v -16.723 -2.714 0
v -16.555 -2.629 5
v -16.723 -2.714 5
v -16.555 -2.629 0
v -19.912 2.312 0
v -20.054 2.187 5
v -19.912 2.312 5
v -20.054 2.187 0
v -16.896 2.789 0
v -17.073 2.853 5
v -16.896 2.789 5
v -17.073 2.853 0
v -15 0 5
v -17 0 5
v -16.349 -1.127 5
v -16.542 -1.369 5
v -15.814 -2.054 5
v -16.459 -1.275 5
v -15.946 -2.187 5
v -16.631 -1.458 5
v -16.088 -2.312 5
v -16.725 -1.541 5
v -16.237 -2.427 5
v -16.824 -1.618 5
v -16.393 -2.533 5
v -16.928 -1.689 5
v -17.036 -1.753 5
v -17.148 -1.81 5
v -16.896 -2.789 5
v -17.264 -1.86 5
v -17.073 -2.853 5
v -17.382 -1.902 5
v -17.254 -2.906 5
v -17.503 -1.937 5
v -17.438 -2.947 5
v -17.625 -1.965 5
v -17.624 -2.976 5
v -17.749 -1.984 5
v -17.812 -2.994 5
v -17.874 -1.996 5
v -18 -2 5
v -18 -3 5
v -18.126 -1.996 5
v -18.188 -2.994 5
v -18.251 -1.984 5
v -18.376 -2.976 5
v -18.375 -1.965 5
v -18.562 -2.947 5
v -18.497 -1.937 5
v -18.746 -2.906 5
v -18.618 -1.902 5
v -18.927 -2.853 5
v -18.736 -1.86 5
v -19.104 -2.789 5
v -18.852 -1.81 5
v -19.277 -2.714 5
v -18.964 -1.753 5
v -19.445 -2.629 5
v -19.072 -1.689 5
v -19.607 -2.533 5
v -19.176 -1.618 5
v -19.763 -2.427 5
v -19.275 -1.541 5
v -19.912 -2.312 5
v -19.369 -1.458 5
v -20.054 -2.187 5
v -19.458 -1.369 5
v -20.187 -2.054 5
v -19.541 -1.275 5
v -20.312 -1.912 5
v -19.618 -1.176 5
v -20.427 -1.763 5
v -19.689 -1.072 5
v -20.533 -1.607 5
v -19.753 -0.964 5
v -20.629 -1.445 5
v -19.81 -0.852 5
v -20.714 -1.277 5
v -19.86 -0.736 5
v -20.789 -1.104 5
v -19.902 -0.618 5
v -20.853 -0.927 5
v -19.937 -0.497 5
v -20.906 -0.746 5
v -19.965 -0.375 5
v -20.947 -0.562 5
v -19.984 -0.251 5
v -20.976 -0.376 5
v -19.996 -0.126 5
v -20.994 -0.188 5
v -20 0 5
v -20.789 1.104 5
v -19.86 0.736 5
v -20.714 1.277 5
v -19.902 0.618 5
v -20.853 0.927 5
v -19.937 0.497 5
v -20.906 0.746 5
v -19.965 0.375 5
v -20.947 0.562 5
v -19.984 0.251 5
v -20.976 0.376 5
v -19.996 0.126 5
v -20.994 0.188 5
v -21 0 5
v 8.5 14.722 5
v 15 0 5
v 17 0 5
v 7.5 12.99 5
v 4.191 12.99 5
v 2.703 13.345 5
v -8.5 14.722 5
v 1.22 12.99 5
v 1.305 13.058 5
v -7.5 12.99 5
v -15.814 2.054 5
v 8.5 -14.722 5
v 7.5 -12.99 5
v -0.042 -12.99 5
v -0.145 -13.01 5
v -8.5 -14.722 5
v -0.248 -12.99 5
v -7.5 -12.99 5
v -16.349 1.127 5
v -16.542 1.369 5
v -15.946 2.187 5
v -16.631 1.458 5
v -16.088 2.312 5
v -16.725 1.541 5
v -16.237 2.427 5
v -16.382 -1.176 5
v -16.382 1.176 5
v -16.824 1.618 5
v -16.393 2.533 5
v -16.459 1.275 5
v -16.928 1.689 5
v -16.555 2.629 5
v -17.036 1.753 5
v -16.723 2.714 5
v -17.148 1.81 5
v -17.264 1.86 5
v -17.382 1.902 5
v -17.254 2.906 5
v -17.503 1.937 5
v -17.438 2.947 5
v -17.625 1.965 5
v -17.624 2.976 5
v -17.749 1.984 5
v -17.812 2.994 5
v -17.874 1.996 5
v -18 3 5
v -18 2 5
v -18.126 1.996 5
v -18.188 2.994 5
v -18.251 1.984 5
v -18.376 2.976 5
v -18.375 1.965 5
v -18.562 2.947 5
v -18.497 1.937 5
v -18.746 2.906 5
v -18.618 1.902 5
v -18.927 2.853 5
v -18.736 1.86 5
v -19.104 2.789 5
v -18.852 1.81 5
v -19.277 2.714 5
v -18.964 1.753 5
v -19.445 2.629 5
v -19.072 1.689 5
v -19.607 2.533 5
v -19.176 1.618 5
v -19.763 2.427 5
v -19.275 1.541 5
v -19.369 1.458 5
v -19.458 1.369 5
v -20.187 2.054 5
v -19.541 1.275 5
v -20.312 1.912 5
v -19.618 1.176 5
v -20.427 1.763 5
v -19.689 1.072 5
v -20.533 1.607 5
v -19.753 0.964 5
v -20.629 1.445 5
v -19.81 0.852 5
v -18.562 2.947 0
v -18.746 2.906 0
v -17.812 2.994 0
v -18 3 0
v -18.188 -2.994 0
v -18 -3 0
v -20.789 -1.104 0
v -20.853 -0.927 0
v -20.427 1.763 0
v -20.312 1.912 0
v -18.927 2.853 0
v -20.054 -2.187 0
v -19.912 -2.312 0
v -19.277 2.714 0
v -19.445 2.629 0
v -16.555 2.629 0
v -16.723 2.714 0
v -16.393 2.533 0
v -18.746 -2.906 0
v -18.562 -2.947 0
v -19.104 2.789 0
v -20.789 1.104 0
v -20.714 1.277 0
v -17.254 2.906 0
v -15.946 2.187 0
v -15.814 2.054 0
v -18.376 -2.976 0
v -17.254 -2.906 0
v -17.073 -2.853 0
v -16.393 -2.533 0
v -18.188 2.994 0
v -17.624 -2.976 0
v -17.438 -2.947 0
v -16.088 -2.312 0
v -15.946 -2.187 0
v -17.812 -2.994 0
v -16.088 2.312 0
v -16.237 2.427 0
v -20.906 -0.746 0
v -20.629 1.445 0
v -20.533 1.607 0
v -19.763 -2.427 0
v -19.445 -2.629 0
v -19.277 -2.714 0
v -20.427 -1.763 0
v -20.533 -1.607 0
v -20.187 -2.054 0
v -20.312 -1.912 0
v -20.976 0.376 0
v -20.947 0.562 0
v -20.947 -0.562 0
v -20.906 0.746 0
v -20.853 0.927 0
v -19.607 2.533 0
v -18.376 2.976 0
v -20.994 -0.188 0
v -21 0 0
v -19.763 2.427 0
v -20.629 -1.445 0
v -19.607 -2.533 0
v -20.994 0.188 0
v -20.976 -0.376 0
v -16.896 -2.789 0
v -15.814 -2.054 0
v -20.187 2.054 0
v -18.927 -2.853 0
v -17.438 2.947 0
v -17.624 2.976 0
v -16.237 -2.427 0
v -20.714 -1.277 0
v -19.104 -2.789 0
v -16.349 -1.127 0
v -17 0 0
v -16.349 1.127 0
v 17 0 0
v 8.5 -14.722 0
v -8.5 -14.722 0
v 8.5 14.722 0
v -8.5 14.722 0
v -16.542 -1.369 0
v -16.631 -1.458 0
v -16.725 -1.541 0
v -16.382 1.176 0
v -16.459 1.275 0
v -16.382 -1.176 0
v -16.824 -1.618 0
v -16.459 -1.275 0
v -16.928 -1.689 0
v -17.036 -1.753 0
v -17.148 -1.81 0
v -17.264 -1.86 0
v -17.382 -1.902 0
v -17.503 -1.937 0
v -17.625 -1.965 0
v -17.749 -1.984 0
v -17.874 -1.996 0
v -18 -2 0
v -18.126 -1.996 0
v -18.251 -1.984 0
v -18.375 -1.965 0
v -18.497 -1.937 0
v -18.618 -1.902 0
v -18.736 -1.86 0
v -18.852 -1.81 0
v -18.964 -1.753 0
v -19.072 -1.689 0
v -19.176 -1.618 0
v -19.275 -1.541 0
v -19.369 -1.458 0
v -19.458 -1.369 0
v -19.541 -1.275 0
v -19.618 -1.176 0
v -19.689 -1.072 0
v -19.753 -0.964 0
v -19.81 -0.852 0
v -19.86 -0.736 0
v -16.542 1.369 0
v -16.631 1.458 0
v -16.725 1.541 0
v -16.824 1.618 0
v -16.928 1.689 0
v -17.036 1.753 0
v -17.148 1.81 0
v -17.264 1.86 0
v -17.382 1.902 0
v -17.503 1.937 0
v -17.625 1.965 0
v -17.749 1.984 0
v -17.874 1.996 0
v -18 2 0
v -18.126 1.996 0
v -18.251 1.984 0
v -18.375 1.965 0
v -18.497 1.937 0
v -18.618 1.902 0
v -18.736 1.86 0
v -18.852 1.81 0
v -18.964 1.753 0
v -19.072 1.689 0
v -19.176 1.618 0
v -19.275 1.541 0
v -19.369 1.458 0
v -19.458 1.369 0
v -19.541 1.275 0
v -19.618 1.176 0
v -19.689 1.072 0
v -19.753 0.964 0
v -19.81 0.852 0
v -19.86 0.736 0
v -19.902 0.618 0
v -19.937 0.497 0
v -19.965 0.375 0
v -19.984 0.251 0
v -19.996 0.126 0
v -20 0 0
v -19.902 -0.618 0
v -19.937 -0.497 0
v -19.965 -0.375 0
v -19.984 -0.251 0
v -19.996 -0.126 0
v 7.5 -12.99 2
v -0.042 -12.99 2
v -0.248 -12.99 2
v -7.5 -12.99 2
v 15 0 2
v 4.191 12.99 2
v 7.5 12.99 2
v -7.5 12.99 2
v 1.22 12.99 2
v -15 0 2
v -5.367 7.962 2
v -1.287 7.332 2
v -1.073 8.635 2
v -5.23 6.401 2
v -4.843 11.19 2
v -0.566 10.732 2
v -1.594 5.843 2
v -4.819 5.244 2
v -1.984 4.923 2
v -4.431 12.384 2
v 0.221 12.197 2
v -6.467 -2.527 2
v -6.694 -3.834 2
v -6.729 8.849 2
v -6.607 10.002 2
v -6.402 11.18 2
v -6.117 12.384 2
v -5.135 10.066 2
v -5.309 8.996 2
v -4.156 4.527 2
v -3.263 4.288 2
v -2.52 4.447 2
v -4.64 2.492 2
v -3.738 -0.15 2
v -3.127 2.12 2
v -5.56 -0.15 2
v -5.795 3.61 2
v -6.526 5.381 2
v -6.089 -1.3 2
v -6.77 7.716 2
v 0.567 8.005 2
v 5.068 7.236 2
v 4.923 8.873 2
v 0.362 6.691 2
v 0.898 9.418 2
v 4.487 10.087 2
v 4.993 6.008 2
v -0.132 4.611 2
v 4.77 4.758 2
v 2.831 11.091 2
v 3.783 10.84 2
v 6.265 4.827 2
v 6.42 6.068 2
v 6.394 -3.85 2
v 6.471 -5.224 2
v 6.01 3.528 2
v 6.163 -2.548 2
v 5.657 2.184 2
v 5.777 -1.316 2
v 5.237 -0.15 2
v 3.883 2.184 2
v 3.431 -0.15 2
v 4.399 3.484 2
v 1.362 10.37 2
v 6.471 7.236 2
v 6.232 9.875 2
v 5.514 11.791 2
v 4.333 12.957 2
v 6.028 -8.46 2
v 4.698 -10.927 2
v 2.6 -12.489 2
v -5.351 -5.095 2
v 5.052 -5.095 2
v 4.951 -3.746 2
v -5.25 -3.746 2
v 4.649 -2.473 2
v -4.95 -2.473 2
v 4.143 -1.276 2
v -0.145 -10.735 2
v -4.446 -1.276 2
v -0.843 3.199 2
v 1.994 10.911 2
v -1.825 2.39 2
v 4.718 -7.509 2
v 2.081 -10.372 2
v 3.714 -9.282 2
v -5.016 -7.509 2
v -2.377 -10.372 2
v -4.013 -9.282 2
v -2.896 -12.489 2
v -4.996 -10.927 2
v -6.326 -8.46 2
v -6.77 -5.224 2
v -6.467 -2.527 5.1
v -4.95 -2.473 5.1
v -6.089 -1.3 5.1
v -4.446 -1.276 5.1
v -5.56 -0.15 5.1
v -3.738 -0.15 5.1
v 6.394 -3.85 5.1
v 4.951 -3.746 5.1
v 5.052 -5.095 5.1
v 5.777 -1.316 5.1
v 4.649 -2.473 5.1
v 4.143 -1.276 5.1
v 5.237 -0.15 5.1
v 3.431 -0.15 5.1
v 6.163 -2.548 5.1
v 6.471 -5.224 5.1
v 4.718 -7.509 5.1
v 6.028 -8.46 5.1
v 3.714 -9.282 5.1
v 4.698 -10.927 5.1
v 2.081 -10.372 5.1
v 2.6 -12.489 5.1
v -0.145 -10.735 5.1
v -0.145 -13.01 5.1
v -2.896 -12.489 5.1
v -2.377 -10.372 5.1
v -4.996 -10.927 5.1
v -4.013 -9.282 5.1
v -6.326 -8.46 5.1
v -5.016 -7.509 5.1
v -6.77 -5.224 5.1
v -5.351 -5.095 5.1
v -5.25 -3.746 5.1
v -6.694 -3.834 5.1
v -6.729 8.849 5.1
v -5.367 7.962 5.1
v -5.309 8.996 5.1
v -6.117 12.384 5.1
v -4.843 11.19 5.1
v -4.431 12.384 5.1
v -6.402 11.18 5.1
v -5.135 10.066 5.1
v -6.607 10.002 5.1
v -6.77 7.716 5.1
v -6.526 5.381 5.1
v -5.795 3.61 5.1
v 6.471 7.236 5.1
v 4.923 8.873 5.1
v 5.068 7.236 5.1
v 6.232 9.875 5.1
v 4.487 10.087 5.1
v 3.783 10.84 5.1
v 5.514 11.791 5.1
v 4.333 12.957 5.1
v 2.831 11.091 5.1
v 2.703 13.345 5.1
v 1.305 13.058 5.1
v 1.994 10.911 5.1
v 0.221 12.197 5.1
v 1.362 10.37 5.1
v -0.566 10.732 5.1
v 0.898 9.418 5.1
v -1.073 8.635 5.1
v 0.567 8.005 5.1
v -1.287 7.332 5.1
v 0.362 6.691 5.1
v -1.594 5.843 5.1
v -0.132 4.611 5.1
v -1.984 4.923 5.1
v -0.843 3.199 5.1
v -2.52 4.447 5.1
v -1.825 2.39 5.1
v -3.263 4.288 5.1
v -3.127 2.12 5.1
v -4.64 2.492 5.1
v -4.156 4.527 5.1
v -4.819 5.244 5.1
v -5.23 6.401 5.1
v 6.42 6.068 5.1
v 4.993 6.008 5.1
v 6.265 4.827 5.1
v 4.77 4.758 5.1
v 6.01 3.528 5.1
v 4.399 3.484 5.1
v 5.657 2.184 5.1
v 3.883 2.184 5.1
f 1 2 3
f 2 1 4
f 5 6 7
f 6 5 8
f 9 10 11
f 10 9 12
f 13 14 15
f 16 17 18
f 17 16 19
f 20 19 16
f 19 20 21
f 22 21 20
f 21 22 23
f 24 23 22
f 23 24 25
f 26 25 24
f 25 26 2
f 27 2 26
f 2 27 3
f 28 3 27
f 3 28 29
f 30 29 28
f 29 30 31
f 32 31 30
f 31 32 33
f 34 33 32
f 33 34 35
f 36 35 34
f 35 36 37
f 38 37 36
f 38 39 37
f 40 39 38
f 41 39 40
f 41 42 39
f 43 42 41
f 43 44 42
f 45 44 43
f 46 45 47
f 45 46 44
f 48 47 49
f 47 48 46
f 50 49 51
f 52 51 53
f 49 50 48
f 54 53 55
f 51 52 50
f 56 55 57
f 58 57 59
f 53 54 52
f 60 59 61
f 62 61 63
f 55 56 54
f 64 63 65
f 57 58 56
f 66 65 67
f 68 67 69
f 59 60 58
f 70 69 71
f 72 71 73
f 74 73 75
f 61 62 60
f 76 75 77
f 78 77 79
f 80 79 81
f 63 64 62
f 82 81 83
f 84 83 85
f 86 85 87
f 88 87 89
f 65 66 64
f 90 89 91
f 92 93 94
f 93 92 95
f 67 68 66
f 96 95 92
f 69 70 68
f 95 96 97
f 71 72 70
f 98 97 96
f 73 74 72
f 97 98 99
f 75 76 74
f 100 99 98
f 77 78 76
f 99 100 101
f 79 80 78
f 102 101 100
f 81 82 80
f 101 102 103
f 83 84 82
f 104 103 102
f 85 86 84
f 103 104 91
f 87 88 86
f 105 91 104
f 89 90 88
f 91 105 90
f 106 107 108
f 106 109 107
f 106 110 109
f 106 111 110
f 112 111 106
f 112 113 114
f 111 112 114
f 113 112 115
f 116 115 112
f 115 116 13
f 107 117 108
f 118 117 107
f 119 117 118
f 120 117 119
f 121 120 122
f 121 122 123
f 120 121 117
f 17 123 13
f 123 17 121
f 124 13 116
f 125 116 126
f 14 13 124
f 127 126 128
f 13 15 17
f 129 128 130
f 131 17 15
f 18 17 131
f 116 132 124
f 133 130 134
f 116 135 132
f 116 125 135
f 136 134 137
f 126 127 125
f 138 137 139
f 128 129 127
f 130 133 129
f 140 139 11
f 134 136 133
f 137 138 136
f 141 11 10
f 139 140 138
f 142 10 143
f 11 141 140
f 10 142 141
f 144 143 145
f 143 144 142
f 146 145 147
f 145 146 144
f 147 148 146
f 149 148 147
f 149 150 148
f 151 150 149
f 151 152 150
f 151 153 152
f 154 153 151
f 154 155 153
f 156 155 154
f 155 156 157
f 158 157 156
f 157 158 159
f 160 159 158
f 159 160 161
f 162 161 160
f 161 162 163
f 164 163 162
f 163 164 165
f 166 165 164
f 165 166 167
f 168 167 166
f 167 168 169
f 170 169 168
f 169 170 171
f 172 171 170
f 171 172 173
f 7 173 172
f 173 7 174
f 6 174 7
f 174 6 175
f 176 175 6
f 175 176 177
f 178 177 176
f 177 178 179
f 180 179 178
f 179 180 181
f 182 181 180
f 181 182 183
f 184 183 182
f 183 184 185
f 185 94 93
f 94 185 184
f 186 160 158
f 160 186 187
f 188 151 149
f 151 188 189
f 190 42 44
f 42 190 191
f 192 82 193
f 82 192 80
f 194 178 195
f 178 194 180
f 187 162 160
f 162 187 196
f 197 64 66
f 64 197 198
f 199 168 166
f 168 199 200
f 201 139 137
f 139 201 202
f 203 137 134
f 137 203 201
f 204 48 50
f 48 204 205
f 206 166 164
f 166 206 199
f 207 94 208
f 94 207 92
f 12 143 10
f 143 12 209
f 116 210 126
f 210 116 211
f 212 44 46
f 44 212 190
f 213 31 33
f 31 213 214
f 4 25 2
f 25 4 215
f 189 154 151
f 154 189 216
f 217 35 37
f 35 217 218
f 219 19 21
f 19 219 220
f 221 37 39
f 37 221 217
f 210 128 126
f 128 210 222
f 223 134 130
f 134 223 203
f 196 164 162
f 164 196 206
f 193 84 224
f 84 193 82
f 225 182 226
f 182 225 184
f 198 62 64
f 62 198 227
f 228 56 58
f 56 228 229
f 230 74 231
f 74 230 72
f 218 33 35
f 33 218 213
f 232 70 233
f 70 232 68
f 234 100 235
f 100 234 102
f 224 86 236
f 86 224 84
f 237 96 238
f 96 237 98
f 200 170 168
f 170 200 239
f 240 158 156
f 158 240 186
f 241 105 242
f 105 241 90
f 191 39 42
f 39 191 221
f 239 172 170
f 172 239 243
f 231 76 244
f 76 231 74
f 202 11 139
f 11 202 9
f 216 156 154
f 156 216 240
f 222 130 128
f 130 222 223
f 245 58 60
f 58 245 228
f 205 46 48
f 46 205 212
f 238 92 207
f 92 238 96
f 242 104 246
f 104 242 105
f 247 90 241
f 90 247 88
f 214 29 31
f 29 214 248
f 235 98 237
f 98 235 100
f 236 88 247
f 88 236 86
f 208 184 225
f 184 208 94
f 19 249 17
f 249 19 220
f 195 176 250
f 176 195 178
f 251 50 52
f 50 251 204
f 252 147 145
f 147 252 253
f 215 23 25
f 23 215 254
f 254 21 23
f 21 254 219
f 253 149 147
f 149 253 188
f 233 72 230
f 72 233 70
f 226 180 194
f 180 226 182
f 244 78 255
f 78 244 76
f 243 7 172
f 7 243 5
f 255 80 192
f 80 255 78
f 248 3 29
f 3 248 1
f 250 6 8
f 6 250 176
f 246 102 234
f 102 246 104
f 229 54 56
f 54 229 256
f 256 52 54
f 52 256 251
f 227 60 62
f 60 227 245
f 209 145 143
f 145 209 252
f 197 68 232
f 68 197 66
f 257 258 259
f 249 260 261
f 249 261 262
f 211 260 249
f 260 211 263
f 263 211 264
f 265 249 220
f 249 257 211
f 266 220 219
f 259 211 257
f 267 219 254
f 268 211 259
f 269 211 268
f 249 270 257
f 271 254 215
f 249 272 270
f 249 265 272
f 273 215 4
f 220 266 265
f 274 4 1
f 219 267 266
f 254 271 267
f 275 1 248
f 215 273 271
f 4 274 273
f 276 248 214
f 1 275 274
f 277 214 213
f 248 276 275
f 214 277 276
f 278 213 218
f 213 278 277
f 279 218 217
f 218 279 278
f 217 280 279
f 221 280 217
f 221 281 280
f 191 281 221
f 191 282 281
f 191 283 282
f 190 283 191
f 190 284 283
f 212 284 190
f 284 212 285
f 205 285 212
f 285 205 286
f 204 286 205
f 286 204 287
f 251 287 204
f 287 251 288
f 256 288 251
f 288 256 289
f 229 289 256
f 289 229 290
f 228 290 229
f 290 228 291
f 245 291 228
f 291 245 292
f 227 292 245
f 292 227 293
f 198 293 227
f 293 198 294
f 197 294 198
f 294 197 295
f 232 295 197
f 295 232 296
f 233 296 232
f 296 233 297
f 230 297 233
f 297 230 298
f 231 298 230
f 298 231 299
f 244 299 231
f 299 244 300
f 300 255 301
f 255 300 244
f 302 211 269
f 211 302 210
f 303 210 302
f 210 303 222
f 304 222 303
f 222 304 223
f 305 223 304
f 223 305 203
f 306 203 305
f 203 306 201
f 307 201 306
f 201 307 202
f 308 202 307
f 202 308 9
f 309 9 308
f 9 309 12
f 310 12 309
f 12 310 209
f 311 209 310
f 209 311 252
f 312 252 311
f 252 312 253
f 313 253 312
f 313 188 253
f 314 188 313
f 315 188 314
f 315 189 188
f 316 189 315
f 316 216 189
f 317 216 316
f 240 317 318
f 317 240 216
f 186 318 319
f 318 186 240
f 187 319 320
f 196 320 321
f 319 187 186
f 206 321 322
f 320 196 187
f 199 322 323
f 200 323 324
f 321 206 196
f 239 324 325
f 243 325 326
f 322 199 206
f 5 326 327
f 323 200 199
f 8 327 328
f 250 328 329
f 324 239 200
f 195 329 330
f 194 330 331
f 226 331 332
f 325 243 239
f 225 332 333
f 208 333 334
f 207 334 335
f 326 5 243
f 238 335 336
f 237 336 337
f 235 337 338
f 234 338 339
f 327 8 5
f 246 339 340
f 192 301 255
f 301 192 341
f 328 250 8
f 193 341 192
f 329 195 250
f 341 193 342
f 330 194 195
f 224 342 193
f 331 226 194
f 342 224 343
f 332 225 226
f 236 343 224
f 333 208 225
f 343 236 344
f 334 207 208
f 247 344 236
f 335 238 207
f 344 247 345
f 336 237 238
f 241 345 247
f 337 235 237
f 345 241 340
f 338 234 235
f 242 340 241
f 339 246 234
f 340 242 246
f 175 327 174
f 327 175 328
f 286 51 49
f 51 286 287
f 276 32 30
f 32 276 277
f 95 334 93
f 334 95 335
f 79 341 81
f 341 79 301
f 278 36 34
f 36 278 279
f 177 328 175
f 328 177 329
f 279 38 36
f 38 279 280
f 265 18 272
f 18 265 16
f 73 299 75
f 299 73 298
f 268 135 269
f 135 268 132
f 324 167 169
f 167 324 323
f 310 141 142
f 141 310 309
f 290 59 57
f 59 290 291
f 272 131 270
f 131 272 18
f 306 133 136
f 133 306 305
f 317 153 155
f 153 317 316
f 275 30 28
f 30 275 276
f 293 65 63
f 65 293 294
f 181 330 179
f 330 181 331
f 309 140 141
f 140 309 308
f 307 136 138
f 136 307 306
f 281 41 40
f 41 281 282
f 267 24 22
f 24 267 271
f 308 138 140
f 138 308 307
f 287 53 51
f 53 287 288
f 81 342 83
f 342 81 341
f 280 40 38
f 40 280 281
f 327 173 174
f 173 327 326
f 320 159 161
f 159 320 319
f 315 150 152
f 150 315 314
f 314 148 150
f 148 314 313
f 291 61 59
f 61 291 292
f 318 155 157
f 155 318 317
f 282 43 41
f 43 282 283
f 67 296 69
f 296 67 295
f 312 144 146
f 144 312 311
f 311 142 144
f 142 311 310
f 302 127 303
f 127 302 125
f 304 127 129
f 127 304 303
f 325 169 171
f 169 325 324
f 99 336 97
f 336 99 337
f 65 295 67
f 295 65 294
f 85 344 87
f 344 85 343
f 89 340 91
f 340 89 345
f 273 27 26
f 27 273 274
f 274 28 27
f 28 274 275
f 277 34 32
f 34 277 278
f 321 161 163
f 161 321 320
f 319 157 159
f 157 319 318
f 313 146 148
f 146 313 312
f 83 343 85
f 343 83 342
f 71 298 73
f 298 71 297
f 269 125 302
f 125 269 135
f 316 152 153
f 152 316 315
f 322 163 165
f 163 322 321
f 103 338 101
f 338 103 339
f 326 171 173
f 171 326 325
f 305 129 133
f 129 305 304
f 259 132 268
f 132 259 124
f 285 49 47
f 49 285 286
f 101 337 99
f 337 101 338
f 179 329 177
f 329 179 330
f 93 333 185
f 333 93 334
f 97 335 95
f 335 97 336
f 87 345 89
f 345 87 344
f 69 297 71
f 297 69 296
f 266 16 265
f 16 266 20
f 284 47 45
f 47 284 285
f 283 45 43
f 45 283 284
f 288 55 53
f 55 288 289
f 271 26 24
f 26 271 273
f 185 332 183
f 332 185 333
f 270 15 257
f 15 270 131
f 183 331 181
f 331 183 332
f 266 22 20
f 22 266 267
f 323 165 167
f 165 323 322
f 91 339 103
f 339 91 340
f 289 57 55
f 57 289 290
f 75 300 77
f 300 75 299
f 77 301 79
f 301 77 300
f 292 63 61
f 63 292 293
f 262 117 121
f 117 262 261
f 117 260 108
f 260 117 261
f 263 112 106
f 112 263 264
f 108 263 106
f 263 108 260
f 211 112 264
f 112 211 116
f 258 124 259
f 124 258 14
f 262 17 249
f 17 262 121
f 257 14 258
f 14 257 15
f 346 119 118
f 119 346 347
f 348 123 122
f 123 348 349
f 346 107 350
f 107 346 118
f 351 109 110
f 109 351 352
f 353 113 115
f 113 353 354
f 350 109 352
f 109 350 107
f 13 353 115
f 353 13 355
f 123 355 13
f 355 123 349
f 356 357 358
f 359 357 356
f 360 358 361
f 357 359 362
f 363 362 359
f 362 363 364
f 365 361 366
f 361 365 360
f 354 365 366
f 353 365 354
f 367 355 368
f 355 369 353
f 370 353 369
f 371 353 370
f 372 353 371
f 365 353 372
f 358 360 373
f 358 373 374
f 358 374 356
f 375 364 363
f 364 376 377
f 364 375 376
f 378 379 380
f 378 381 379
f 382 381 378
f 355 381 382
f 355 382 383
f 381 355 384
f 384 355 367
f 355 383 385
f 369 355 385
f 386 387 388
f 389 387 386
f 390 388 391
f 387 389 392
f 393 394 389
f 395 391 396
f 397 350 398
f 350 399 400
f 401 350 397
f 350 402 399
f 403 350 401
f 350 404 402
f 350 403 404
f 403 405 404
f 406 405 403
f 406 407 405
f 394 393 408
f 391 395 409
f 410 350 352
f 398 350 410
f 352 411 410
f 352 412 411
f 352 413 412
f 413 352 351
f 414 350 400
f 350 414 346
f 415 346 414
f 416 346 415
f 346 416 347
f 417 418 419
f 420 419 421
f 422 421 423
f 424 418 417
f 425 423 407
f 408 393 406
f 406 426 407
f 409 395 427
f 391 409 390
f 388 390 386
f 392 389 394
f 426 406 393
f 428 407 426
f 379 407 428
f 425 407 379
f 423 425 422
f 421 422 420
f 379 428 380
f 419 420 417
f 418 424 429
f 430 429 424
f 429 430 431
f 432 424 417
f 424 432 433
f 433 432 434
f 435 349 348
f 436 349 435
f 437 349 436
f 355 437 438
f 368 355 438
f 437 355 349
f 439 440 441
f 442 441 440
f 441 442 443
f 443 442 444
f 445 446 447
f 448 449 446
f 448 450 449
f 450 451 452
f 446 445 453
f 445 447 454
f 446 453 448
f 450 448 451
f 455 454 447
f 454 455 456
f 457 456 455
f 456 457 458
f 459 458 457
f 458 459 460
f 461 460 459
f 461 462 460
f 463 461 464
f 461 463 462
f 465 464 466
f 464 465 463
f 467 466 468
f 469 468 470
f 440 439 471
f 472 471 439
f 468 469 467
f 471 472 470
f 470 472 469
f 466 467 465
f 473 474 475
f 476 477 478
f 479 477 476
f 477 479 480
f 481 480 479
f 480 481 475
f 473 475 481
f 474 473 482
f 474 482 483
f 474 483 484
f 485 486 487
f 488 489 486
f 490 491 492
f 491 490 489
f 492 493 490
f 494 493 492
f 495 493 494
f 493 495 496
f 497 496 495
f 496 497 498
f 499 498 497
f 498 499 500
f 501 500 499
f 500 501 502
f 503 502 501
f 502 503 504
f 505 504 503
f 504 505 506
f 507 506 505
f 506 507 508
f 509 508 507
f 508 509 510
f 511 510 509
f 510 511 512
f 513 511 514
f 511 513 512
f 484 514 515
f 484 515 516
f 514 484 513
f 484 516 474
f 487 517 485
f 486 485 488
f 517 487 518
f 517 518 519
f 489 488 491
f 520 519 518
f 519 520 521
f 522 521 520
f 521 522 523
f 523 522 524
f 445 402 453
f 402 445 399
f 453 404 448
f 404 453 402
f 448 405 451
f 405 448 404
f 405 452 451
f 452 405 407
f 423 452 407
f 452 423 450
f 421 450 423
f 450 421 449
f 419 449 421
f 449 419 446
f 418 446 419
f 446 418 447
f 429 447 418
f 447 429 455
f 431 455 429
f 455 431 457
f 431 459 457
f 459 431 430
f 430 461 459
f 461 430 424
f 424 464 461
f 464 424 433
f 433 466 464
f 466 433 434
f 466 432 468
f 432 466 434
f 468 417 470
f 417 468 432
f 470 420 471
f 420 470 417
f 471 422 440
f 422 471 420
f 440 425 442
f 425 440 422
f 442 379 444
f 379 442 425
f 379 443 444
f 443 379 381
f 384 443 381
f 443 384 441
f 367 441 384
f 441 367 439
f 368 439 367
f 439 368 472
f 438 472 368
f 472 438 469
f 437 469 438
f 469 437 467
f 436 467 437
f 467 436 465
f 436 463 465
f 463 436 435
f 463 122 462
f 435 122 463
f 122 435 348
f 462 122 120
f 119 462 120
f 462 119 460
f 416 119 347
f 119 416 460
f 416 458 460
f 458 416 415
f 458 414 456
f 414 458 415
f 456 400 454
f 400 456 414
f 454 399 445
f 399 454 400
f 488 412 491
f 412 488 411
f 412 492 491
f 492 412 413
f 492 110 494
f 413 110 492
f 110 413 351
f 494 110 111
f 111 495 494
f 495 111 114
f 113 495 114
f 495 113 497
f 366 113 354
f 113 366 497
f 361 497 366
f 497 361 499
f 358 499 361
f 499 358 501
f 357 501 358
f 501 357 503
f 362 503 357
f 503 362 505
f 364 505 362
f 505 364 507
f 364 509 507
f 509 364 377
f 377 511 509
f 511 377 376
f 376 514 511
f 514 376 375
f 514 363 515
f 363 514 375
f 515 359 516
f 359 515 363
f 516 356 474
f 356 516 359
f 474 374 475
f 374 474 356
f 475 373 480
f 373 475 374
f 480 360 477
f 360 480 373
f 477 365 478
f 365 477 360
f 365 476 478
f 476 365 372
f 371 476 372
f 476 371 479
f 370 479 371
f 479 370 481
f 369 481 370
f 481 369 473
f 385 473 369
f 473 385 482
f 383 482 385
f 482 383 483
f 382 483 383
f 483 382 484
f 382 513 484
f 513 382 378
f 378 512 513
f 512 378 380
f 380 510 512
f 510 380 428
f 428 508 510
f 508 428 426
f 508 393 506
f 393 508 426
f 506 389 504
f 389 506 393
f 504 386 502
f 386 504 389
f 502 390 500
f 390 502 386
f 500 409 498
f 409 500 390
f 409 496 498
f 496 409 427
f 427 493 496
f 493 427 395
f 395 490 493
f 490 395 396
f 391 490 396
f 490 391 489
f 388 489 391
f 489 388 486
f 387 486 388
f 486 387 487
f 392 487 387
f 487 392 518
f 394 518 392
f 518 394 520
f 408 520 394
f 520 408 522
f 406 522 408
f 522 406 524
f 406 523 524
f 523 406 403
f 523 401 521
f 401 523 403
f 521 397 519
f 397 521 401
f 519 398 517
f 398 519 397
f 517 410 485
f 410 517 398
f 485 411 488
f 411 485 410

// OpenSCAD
union() {
        translate(v=[-18,0,0]) {
        difference() {
        
        color("grey")
        cylinder(r=3,h=5,$fn=100);
        translate(v=[0,0,-1]) {
        cylinder(r=2,h=7,$fn=100);
        }
        }
    }
    
    difference() {
        color("grey")
        cylinder(r=17,h=5,$fn=6);
        color("grey")
        translate(v=[0,0,2]) {
            cylinder(r=15,h=5,$fn=6);
        }
    }

    scale([2.8,3.5,1.7]) {  
        linear_extrude(height=3) { 
           rotate([0, 0, 90]) {
          text("CS",4.5, font="Algerian",halign = "center", valign = "center");  
           }
        } 
    } 
}          
